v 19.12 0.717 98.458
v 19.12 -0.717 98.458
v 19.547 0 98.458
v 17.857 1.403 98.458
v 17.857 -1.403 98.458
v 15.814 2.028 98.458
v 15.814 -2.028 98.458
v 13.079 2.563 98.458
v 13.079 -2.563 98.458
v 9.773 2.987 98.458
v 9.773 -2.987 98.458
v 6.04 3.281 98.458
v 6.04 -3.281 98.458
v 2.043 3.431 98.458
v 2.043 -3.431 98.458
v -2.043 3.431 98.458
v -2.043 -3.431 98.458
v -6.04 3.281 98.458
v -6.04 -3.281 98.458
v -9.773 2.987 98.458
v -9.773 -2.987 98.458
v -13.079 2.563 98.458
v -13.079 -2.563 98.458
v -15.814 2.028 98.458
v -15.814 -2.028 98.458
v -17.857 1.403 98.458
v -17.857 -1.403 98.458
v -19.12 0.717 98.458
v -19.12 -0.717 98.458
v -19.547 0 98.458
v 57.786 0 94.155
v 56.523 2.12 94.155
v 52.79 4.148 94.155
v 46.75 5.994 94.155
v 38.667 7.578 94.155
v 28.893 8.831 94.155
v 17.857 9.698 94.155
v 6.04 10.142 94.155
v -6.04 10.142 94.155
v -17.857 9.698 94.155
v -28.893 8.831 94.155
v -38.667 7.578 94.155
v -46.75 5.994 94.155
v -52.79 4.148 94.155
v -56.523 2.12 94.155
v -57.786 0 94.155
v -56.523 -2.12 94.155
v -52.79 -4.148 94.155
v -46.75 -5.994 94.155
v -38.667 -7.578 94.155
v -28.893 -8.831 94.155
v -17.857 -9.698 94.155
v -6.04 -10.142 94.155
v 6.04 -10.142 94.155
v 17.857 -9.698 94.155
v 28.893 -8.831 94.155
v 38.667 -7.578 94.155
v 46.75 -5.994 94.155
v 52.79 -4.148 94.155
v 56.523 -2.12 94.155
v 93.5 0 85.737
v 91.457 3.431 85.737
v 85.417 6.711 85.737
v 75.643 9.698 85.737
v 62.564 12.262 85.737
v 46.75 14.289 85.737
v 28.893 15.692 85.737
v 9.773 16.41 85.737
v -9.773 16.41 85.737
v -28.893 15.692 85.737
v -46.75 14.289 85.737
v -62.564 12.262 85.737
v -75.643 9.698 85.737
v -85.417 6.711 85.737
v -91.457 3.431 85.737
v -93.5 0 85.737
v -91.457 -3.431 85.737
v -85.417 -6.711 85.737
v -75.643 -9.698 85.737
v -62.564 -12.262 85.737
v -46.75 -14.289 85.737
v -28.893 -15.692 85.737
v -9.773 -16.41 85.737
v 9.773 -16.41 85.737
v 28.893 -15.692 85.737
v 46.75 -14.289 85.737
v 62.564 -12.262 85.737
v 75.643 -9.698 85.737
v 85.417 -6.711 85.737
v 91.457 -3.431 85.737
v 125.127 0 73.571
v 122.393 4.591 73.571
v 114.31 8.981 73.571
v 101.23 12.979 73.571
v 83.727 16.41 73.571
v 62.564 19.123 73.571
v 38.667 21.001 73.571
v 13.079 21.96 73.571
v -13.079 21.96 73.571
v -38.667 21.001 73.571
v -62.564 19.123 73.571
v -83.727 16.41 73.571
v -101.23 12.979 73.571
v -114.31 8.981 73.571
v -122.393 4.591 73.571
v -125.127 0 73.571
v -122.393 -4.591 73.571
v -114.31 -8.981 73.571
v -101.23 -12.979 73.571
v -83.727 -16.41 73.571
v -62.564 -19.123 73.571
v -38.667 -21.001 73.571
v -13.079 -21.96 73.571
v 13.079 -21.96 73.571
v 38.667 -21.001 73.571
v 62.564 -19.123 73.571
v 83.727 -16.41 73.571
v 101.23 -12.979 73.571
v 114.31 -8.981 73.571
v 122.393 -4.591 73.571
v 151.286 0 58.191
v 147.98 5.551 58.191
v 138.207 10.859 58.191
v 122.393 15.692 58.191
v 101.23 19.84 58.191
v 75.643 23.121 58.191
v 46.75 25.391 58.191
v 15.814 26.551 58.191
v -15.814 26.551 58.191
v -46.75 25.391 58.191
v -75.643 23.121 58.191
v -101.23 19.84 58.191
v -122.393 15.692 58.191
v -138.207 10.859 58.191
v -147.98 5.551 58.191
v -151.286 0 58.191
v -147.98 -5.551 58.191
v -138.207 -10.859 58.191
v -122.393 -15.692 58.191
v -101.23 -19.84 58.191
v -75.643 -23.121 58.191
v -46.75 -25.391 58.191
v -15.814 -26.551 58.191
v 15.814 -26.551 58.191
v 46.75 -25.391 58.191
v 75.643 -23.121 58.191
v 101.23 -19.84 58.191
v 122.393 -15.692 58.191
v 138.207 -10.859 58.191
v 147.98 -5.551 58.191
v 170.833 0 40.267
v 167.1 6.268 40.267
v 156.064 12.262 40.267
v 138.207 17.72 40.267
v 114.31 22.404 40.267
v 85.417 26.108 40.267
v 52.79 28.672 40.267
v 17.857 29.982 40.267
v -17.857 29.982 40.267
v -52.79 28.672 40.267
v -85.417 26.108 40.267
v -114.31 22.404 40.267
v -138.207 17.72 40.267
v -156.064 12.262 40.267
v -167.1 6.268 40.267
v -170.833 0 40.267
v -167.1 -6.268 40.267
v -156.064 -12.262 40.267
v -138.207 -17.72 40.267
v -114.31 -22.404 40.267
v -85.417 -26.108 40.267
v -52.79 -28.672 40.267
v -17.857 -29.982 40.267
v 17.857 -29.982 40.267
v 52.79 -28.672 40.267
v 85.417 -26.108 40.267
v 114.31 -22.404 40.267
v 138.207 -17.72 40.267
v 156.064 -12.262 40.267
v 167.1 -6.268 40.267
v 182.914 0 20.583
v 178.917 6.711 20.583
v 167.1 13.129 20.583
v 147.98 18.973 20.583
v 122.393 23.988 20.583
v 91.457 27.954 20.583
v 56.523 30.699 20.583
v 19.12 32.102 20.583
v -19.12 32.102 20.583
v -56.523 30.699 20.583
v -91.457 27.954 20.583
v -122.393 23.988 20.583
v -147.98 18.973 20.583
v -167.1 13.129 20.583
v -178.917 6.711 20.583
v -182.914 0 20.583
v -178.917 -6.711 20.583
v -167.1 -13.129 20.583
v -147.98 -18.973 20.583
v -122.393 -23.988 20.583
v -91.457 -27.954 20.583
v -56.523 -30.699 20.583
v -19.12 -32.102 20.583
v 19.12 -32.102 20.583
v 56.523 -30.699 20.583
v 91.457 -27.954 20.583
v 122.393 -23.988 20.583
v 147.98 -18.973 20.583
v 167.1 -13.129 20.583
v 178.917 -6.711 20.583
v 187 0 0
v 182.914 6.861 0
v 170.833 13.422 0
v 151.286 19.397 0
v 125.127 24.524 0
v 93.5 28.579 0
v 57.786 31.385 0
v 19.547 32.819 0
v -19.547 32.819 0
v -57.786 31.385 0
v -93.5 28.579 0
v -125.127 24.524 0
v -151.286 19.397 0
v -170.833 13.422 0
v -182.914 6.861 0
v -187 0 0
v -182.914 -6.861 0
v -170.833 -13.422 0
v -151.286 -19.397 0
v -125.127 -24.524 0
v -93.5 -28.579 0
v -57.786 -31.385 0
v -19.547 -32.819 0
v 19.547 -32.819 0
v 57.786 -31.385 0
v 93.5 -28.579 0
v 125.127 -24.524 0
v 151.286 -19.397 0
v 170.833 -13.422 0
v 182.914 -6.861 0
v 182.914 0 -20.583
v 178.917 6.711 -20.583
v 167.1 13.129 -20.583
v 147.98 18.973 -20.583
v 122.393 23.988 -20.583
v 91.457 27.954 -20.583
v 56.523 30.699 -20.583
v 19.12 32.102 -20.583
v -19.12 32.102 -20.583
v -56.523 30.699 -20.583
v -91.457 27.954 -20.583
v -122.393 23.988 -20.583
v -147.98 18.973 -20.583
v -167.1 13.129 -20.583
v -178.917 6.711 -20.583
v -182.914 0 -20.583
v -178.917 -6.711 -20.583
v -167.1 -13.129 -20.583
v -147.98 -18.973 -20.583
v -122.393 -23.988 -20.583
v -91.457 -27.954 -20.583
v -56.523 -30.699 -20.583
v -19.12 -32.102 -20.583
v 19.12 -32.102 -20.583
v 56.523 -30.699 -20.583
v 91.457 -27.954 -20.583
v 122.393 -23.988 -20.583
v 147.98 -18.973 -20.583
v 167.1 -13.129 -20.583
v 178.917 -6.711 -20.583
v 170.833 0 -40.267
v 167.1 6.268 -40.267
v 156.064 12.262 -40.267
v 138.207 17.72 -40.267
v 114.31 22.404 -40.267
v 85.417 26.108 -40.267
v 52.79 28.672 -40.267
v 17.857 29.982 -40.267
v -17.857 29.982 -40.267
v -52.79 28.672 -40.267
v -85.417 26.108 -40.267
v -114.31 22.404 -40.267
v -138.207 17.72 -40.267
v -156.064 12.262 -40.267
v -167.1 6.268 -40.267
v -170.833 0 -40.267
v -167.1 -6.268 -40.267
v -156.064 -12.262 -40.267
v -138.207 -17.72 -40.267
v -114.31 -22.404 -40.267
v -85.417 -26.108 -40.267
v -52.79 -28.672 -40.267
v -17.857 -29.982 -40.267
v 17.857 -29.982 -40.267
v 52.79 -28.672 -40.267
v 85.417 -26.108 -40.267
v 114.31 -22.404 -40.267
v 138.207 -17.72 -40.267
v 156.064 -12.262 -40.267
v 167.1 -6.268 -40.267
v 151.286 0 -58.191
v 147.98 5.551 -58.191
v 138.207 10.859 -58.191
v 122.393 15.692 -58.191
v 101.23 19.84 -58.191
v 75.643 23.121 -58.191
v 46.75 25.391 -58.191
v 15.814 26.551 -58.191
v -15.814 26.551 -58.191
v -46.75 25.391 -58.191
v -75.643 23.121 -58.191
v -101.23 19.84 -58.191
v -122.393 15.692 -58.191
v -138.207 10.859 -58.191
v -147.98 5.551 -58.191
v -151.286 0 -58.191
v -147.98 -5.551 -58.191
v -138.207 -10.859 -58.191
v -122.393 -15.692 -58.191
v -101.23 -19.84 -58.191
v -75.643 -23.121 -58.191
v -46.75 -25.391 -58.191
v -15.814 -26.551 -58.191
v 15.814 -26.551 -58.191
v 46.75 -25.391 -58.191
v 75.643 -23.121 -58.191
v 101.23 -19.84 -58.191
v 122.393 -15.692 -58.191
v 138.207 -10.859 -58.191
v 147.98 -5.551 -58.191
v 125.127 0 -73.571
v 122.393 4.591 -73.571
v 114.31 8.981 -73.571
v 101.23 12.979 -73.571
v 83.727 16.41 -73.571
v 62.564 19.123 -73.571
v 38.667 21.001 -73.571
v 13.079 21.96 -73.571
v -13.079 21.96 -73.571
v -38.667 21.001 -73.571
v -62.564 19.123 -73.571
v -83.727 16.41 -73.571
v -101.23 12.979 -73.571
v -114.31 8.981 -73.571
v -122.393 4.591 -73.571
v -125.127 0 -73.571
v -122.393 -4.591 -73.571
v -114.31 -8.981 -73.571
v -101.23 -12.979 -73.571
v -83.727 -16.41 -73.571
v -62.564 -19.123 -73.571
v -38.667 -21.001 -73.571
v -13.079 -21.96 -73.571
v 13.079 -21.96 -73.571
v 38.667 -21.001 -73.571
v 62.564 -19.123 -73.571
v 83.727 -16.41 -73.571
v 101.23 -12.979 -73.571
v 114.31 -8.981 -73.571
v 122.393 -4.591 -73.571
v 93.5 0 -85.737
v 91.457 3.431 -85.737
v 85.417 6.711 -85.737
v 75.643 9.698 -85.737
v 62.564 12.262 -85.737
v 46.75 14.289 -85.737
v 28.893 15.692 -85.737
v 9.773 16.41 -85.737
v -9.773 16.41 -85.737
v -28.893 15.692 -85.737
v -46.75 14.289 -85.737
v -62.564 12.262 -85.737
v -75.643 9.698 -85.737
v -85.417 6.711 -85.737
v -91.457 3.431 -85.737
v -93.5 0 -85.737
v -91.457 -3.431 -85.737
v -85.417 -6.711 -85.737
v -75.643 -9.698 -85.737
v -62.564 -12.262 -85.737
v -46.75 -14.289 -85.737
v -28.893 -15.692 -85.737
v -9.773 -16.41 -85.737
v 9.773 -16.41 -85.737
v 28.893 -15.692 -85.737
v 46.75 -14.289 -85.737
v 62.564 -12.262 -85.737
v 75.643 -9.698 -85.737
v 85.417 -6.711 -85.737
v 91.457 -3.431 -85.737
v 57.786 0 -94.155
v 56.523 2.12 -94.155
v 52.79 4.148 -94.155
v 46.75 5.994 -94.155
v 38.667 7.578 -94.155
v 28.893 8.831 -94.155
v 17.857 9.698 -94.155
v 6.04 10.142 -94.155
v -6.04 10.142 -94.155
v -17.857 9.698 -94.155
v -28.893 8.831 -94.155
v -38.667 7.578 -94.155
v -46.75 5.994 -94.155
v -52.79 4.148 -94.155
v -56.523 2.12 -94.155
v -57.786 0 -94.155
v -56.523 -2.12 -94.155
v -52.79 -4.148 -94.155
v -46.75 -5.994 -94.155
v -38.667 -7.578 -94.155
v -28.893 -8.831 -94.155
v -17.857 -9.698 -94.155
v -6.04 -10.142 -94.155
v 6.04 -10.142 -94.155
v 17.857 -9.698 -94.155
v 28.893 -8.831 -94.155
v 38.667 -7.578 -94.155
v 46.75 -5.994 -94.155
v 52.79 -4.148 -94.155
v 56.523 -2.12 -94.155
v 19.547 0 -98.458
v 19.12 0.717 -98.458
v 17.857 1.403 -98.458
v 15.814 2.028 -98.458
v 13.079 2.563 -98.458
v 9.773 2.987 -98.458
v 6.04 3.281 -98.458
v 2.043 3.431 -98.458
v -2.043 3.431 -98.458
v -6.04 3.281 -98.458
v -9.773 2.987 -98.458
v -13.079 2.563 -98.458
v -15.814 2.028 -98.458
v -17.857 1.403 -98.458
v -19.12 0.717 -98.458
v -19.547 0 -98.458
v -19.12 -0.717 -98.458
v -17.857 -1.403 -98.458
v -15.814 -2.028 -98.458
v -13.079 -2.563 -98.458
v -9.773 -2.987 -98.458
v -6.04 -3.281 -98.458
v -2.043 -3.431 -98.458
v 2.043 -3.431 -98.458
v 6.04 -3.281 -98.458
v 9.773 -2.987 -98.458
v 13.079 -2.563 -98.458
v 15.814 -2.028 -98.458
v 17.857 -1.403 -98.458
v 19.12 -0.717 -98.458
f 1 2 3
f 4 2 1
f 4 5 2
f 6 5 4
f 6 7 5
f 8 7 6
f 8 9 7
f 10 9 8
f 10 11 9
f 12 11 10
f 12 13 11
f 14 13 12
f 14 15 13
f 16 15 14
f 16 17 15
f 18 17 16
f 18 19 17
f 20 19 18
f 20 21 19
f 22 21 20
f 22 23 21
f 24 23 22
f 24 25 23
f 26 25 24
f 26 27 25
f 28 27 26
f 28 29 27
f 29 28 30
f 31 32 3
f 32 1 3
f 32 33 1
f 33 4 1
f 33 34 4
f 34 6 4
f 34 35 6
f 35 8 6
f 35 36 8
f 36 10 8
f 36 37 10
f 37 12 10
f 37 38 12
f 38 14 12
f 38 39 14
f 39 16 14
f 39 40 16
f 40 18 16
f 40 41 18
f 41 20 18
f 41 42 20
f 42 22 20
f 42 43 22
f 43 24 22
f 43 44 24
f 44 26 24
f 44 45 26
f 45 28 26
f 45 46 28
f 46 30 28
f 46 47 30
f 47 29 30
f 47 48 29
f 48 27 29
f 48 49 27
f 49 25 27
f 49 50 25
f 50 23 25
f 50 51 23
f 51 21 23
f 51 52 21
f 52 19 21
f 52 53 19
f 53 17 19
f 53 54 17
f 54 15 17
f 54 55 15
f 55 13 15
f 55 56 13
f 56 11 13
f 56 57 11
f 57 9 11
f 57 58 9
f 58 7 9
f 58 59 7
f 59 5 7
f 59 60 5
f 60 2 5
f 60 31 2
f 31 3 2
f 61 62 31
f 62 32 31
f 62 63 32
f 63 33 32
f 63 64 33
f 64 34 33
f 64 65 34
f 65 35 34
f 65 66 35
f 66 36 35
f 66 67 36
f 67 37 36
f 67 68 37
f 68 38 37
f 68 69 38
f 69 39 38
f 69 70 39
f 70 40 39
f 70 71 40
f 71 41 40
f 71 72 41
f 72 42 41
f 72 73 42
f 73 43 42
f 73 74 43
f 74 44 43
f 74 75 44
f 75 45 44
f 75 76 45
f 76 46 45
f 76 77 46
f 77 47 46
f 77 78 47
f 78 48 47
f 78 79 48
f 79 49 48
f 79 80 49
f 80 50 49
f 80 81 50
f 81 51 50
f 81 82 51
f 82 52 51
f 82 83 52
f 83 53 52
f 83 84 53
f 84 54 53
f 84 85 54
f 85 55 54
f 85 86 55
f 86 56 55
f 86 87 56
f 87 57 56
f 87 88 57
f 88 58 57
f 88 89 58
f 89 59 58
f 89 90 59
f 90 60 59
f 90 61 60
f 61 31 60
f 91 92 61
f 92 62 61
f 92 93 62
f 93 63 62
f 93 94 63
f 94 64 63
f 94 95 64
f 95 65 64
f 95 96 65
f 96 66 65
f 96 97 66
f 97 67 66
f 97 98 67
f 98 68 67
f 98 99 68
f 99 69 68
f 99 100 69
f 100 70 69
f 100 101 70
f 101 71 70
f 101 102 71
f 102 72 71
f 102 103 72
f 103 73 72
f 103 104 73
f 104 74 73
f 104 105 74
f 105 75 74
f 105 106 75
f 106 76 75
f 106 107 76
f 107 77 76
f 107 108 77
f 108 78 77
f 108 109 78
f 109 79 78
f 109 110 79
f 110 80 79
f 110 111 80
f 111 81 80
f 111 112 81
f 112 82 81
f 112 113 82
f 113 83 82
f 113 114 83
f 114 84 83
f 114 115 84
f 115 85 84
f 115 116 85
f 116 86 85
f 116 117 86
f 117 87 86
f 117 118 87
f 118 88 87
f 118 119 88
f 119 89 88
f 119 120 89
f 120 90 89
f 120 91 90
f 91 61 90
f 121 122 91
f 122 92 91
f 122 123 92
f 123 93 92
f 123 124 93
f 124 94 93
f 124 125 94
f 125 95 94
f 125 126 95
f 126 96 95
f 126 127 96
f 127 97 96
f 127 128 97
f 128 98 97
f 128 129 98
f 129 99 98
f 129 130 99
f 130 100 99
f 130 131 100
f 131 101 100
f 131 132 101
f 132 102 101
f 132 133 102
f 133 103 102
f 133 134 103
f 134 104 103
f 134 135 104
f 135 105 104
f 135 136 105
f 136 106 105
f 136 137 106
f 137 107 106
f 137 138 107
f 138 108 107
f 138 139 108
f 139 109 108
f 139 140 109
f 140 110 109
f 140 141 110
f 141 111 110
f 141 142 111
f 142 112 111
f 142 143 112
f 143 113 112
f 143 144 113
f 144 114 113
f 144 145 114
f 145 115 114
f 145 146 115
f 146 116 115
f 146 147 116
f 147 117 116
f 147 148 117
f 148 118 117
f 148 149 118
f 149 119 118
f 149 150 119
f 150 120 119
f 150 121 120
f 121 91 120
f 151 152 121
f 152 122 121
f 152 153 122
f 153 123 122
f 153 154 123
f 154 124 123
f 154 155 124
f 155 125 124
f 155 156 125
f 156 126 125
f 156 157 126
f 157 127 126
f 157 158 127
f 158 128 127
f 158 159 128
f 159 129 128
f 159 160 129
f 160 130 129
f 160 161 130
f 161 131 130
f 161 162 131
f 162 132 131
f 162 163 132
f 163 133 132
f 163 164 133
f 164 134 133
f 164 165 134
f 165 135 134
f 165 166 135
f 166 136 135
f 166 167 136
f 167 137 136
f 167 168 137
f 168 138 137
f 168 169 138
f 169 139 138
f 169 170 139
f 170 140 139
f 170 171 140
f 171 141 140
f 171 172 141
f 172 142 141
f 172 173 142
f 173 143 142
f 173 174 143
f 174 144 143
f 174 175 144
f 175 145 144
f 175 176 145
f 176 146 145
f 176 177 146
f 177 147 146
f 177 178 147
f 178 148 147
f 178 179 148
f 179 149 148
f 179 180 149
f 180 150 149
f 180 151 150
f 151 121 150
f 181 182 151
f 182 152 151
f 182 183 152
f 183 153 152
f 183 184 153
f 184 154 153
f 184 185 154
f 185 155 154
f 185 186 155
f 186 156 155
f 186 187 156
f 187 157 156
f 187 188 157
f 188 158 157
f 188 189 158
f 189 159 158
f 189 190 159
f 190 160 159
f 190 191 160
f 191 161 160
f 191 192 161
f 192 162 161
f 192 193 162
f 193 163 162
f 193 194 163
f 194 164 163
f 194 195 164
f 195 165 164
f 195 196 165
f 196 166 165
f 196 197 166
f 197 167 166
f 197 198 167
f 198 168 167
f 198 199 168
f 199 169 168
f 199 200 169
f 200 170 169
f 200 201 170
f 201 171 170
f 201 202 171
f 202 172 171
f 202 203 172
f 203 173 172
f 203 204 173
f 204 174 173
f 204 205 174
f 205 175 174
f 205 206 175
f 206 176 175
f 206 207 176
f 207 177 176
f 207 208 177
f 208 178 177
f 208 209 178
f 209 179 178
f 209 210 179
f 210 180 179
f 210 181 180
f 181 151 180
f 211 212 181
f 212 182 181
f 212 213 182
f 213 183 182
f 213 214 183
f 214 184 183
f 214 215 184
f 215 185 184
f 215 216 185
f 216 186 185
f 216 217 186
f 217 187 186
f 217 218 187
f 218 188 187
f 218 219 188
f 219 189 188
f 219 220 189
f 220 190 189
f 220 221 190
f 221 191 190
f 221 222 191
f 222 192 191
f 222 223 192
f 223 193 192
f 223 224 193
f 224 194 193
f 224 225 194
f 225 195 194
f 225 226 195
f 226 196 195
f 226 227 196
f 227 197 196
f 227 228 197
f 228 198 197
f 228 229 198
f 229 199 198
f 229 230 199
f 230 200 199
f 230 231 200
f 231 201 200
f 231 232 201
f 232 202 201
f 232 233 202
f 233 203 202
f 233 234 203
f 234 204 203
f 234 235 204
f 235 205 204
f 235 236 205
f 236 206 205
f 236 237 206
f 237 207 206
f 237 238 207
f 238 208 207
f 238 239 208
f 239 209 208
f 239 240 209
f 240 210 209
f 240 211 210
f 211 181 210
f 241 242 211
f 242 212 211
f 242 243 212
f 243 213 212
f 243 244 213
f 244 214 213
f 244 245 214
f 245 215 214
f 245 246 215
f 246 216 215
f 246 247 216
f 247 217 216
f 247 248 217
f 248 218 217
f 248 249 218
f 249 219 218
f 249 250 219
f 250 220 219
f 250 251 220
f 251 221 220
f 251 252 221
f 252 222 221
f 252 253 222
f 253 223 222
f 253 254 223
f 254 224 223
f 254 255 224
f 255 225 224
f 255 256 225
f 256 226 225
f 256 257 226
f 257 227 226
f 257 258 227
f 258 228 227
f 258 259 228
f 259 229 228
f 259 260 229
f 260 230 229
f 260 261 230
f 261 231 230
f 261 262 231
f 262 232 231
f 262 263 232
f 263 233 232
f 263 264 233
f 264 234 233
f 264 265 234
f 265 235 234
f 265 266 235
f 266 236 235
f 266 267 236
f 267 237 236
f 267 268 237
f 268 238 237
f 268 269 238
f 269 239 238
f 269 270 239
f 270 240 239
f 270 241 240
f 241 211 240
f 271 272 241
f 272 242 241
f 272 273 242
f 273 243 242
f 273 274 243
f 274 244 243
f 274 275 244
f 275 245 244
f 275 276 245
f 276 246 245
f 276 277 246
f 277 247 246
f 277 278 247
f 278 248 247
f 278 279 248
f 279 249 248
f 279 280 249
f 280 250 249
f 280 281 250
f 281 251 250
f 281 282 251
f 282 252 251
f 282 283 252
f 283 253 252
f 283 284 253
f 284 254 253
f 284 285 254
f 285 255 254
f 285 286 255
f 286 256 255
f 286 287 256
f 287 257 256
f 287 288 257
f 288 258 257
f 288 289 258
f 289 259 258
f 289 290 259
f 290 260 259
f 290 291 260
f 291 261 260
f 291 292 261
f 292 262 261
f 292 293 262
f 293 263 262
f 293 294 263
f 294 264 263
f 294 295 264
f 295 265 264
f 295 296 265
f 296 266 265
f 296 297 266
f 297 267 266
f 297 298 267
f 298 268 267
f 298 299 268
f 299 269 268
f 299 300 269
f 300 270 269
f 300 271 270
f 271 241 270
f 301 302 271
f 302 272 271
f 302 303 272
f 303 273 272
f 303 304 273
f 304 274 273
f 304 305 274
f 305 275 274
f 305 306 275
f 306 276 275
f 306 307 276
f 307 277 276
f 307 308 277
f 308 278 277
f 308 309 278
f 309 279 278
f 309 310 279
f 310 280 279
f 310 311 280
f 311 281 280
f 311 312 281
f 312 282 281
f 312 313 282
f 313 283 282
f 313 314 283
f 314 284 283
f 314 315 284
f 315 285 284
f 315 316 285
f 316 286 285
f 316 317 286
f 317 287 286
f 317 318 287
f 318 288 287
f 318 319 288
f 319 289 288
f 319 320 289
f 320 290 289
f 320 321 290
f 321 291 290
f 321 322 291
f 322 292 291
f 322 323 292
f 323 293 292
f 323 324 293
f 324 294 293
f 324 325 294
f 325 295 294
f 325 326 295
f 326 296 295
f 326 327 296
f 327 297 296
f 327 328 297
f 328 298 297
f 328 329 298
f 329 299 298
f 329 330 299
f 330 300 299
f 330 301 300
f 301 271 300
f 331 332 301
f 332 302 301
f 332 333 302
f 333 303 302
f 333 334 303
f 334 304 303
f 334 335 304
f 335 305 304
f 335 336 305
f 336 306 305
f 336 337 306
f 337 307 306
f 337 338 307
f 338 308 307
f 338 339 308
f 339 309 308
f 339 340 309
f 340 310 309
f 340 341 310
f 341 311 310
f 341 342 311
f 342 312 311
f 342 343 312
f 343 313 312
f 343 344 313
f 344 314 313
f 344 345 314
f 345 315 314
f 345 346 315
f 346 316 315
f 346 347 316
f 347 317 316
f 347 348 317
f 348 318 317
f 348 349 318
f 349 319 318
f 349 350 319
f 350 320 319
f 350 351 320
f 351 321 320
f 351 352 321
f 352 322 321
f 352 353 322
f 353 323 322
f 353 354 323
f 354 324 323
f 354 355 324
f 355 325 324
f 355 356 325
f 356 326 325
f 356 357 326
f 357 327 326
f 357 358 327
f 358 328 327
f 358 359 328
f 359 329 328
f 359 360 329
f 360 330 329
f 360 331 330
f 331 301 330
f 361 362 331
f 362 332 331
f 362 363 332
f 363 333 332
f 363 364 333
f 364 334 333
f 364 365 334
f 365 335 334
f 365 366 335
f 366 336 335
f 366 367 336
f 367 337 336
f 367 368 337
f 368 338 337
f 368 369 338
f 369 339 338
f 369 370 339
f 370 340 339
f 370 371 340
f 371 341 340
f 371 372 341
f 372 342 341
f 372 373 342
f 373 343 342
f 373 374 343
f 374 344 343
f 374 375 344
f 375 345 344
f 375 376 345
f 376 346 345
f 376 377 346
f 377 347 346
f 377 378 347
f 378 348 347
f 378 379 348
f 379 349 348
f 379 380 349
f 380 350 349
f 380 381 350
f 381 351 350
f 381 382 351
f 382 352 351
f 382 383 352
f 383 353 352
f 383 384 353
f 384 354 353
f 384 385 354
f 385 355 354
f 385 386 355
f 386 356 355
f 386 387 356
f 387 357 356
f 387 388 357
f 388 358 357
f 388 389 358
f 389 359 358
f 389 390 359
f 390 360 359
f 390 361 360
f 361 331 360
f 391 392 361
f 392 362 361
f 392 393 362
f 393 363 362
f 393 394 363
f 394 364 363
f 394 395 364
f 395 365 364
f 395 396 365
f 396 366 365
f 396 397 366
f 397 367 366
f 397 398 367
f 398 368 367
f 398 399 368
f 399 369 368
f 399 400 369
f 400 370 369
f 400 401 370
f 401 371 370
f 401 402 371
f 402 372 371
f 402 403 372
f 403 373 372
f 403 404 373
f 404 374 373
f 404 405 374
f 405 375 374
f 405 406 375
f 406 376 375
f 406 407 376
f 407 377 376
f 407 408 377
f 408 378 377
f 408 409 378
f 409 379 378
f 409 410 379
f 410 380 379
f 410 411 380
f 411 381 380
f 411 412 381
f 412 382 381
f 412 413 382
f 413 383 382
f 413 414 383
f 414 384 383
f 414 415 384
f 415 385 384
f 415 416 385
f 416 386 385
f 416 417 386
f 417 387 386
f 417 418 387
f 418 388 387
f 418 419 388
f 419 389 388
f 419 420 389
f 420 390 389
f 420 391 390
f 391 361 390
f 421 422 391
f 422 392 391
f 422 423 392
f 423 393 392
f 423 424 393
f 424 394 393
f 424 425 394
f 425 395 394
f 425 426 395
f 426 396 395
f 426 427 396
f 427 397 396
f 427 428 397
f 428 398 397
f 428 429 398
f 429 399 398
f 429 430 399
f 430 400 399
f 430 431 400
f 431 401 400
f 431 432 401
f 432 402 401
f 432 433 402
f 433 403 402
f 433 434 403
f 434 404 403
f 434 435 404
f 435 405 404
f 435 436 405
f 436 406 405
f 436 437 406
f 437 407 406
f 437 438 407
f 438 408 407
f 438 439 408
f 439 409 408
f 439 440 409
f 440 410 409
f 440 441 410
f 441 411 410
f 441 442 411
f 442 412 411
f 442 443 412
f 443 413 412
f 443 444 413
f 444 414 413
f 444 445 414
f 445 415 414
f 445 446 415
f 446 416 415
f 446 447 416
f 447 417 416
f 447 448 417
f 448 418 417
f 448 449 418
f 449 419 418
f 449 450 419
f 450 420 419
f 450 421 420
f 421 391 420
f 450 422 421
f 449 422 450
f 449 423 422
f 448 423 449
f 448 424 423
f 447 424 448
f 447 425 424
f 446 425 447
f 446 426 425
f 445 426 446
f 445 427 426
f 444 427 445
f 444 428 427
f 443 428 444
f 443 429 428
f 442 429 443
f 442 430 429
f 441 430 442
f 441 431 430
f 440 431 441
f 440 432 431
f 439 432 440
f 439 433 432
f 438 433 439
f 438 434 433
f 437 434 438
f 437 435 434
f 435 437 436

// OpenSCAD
// Generated by SolidPython 1.0.1 on 2020-07-29 00:46:52


scale(v = [17, 3, 9]) {
	sphere(r = 11);
}
/***********************************************
*********      SolidPython code:      **********
************************************************
 
# import packages: SolidPython
from solid import *
from solid.utils import *
from itertools import chain, combinations, permutations


class Resize:

    def __init__(self, scad_file):
        self.scad_file = scad_file
        #self.scad_file = import_scad(scad_file)
        # cone/cylinder param:
        self.r1 = 0
        self.r2 = 0
        self.h = 0
        # rectangular prism param:
        self.w = 0
        self.l = 0
        # ellipse param:
        self.r = 0

    # import OpenScad code (file name corresponds to shape)


    # classify shape + parameters
    def assign(self, param1, param2, param3):
        if self.scad_file == 'cone.scad':
            self.r1 = param1
            self.r2 = param2
            self.h = param3
        elif self.scad_file == 'cylinder.scad':
            self.r1 = param1
            self.r2 = param2
            self.h = param3
        elif self.scad_file == 'rectangularPrism.scad':
            self.h = param1
            self.l = param2
            self.w = param3
        else:
            self.r = param1
            self.h = param2

    # resize parameters
    def iterate(self):
        x = range(3, 20, 2)
        i = 1
        if self.scad_file == 'cone.scad':
            tempList = list(permutations(x, 2))
            for temp in tempList:
                param1 = temp[0]
                param2 = temp[1]
                filepath = 'produced_scad_files/' + 'cone' + str(param1) + '_' + str(param2) + '_' + '.scad'
                scad_render_to_file(cylinder(h=param1, r1=param2, r2=0), filepath)

        elif self.scad_file == 'cylinder.scad':
            tempList = list(permutations(x, 3))
            for temp in tempList:
                param1 = temp[0]
                param2 = temp[1]
                filepath = 'produced_scad_files/' + 'cylinder' + str(param1) + '_' + str(param2) + '_' + '.scad'
                scad_render_to_file(cylinder(h=param1, r1=param2, r2=param2), filepath)

        elif self.scad_file == 'rectangularPrism.scad':
            tempList = list(permutations(x, 3))
            for temp in tempList:
                param1 = temp[0]
                param2 = temp[1]
                param3 = temp[2]
                filepath = 'produced_scad_files/' + 'rectangularPrism' + str(param1) + '_' + str(param2) + '_' + str(
                    param3) + '.scad'
                scad_render_to_file(cube(size=(param1, param2, param3)), filepath)

        elif self.scad_file == 'ellipse.scad':
            tempList = list(permutations(x, 4))
            for temp in tempList:
                param1 = temp[0]
                param2 = temp[1]
                param3 = temp[2]
                param4 = temp[3]
                filepath = 'produced_scad_files/' + 'ellipse' + str(param1) + '_' + str(param2) + '_' + str(param3) + '_' + str(param4) + '.scad'
                scad_render_to_file(scale([param1, param2, param3])(sphere(r=param4)), filepath)

    def render_to_scadfile(self):
        scad_render_to_file(scad, 'example.scad') 
 
************************************************/
